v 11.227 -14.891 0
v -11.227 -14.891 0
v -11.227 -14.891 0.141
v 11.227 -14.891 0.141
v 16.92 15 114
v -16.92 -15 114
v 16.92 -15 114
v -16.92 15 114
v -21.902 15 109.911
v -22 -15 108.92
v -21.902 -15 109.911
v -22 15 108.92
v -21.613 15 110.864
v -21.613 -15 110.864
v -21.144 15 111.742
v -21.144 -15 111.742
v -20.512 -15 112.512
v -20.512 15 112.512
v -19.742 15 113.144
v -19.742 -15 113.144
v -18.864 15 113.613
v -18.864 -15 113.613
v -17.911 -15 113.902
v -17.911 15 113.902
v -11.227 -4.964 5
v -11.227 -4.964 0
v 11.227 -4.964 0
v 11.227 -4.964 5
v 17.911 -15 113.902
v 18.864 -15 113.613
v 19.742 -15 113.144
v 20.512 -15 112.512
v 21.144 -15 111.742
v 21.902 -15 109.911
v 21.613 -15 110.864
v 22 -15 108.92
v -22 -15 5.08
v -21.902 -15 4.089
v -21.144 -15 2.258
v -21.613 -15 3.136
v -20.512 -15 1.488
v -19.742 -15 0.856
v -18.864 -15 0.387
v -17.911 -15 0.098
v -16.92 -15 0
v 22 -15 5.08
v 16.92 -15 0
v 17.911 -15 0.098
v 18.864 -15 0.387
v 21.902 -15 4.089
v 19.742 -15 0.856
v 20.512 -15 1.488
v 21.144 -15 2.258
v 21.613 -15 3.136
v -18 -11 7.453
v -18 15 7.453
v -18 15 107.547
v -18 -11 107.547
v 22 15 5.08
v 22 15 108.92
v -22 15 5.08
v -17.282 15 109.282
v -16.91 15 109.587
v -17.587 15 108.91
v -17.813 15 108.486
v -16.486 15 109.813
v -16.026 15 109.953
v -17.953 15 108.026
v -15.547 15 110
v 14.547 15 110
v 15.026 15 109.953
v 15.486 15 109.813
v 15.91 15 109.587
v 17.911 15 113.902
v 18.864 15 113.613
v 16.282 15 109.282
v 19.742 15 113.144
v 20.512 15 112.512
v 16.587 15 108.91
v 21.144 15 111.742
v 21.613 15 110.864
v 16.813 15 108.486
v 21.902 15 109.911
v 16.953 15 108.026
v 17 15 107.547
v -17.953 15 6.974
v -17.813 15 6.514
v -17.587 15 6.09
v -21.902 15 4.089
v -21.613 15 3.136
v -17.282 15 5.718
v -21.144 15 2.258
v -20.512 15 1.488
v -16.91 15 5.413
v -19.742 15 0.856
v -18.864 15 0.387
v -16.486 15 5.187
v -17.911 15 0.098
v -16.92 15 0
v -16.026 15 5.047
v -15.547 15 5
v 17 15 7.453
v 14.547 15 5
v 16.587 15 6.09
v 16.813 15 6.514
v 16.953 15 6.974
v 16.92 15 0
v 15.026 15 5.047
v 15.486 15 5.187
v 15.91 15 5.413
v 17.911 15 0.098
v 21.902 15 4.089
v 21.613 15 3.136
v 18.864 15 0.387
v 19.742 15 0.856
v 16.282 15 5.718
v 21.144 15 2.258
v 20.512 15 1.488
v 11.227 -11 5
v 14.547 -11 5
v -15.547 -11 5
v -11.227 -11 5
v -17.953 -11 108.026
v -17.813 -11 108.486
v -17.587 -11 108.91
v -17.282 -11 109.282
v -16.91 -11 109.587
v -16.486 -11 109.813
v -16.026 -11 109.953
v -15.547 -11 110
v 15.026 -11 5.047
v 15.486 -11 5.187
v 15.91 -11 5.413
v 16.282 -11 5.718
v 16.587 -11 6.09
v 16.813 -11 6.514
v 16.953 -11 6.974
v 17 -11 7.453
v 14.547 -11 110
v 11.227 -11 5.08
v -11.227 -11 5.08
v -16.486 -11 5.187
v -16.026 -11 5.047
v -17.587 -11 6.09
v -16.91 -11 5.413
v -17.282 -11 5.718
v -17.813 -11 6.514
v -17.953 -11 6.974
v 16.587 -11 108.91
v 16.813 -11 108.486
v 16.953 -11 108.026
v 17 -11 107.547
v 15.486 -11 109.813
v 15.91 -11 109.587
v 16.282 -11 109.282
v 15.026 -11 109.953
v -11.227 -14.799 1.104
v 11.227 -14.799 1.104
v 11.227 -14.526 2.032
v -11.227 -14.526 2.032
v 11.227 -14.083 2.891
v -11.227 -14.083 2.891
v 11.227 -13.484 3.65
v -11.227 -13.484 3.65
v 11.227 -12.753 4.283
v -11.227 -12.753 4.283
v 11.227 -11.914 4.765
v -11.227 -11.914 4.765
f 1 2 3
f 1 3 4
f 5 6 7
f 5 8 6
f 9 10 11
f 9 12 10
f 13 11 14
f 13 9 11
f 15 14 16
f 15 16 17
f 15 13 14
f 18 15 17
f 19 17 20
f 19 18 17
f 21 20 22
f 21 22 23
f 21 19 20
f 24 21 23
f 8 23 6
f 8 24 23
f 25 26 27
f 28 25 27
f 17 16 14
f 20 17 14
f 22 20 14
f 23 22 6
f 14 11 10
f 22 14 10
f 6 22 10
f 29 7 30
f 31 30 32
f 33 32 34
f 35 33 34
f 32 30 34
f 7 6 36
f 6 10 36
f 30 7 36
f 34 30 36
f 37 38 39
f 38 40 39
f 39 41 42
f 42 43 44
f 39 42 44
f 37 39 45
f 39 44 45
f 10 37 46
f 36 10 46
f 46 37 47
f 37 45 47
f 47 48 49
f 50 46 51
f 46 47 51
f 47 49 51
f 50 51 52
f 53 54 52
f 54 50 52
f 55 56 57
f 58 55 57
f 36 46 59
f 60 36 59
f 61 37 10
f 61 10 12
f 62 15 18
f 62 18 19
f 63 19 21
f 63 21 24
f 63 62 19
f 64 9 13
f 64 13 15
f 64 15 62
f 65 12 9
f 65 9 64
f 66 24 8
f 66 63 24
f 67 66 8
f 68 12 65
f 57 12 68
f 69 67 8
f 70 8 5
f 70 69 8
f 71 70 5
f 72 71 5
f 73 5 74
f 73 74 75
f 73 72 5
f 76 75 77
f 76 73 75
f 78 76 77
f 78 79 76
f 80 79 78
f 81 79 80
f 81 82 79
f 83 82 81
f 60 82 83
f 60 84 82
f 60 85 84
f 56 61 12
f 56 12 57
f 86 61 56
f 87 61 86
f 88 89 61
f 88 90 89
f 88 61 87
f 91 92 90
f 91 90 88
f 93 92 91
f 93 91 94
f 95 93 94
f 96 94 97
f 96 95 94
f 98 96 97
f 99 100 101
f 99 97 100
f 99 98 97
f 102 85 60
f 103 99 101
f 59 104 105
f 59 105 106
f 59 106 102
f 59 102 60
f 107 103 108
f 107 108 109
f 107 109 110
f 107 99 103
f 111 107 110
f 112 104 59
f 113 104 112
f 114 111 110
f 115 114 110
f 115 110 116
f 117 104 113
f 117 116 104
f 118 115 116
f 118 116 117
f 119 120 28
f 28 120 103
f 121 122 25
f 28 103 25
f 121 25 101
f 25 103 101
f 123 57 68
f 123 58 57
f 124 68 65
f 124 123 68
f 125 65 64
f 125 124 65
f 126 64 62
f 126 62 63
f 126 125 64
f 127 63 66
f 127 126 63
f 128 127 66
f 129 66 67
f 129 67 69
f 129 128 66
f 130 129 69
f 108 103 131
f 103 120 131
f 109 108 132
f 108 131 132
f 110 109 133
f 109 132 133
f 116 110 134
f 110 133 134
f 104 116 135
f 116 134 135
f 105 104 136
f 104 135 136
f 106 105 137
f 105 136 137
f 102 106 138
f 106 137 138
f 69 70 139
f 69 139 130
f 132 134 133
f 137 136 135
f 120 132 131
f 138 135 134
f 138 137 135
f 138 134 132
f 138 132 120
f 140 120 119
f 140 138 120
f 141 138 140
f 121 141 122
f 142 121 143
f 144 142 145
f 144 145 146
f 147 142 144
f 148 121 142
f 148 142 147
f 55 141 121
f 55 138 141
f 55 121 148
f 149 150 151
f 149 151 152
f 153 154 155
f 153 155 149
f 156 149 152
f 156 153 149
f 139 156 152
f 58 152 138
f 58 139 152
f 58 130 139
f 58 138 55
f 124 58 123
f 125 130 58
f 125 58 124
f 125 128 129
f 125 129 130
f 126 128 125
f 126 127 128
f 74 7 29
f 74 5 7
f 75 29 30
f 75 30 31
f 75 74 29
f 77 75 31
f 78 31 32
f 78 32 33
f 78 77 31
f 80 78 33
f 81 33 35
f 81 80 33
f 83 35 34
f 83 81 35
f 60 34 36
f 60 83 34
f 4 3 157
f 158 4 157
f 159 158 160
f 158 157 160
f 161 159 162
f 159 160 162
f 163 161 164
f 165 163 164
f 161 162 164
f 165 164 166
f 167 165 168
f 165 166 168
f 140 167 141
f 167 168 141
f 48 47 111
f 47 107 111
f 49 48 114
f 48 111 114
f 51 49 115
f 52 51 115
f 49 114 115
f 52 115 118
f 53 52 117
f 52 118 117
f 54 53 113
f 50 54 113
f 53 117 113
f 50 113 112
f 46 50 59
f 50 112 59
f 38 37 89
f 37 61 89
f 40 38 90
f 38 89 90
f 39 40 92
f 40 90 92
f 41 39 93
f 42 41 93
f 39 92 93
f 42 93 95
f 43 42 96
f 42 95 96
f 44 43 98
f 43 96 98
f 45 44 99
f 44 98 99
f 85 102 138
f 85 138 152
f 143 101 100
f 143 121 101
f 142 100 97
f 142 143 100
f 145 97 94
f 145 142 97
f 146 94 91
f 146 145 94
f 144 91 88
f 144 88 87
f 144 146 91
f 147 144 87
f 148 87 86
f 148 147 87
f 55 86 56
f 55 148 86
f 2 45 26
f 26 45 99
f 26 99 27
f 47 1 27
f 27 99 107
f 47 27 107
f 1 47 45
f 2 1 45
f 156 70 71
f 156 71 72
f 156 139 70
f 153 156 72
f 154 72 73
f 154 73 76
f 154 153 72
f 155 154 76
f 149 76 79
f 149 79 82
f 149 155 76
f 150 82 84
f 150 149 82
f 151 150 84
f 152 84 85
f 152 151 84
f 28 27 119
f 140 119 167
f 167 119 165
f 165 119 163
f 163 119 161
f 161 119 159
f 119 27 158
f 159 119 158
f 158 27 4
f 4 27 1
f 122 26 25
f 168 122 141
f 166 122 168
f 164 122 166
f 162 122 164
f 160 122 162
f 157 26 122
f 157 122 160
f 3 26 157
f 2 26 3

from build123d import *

# Parameters (mm, degrees)
F0_W        = 44
F0_H        = 30
F1_DEPTH    = 114
F2_W        = 35
F2_H        = 105
F3_DEPTH    = 26
F4_R        = 5.08
F5_R        = 2.4528409794
F6_W        = 22.4547982216
F6_H        = 9.9273854867
F7_DEPTH    = 5.08
F8_T1_DEPTH = 22.4547982216


# Not quite as in the source:
# - a fillet or chamfer that OpenCascade refuses, or shapes differently, is made with other operations: its cross-section is extruded or revolved along the edge and cut away or added


with BuildPart() as f1:
    # F0 (on Top) → F1 (new body)
    with BuildSketch(Plane.XY):
        Rectangle(F0_W, F0_H)
    extrude(amount=F1_DEPTH)

    # F2 (on face) → F3 (cut)
    with BuildSketch(Plane(origin=(0, 15, 0), x_dir=(-1, 0, 0), z_dir=(0, 1, 0))):
        with Locations((0.5, 57.5)):
            Rectangle(F2_W, F2_H)
    extrude(amount=-F3_DEPTH, mode=Mode.SUBTRACT)

    # F4
    f4_edges = [f1.edges().sort_by_distance(p)[0] for p in [
        (22, 0, 0),
        (-22, 0, 0),
        (-22, 0, 114),
        (22, 0, 114),
    ]]
    fillet(f4_edges, radius=F4_R)

    # F5
    f5_edges = [f1.edges().sort_by_distance(p)[0] for p in [
        (17, 2, 110),
        (-18, 2, 110),
        (17, 2, 5),
        (-18, 2, 5),
    ]]
    fillet(f5_edges, radius=F5_R)

    # F6 (on face) → F7 (cut)
    with BuildSketch(Plane(origin=(0, 0, 0), x_dir=(1, 0, 0), z_dir=(0, 0, -1))):
        with Locations((0, 9.9273854867)):
            Rectangle(F6_W, F6_H)
    extrude(amount=-F7_DEPTH, mode=Mode.SUBTRACT)

    # F8: fillet of radius 5.08 on 1 edges, made by hand

    # F8_s2 → F8_t1 (join)
    with BuildSketch(Plane.YZ.offset(-11.2273991108)):
        with BuildLine():
            ThreePointArc((-14.89107823, 0.1410866555), (-13.8014493024, 3.2848644314), (-11, 5.08))
            Line((-11, 5.08), (-14.89107823, 5.08))
            Line((-14.89107823, 5.08), (-14.89107823, 0.1410866555))
        make_face()
    extrude(amount=F8_T1_DEPTH)


solid = f1.part
